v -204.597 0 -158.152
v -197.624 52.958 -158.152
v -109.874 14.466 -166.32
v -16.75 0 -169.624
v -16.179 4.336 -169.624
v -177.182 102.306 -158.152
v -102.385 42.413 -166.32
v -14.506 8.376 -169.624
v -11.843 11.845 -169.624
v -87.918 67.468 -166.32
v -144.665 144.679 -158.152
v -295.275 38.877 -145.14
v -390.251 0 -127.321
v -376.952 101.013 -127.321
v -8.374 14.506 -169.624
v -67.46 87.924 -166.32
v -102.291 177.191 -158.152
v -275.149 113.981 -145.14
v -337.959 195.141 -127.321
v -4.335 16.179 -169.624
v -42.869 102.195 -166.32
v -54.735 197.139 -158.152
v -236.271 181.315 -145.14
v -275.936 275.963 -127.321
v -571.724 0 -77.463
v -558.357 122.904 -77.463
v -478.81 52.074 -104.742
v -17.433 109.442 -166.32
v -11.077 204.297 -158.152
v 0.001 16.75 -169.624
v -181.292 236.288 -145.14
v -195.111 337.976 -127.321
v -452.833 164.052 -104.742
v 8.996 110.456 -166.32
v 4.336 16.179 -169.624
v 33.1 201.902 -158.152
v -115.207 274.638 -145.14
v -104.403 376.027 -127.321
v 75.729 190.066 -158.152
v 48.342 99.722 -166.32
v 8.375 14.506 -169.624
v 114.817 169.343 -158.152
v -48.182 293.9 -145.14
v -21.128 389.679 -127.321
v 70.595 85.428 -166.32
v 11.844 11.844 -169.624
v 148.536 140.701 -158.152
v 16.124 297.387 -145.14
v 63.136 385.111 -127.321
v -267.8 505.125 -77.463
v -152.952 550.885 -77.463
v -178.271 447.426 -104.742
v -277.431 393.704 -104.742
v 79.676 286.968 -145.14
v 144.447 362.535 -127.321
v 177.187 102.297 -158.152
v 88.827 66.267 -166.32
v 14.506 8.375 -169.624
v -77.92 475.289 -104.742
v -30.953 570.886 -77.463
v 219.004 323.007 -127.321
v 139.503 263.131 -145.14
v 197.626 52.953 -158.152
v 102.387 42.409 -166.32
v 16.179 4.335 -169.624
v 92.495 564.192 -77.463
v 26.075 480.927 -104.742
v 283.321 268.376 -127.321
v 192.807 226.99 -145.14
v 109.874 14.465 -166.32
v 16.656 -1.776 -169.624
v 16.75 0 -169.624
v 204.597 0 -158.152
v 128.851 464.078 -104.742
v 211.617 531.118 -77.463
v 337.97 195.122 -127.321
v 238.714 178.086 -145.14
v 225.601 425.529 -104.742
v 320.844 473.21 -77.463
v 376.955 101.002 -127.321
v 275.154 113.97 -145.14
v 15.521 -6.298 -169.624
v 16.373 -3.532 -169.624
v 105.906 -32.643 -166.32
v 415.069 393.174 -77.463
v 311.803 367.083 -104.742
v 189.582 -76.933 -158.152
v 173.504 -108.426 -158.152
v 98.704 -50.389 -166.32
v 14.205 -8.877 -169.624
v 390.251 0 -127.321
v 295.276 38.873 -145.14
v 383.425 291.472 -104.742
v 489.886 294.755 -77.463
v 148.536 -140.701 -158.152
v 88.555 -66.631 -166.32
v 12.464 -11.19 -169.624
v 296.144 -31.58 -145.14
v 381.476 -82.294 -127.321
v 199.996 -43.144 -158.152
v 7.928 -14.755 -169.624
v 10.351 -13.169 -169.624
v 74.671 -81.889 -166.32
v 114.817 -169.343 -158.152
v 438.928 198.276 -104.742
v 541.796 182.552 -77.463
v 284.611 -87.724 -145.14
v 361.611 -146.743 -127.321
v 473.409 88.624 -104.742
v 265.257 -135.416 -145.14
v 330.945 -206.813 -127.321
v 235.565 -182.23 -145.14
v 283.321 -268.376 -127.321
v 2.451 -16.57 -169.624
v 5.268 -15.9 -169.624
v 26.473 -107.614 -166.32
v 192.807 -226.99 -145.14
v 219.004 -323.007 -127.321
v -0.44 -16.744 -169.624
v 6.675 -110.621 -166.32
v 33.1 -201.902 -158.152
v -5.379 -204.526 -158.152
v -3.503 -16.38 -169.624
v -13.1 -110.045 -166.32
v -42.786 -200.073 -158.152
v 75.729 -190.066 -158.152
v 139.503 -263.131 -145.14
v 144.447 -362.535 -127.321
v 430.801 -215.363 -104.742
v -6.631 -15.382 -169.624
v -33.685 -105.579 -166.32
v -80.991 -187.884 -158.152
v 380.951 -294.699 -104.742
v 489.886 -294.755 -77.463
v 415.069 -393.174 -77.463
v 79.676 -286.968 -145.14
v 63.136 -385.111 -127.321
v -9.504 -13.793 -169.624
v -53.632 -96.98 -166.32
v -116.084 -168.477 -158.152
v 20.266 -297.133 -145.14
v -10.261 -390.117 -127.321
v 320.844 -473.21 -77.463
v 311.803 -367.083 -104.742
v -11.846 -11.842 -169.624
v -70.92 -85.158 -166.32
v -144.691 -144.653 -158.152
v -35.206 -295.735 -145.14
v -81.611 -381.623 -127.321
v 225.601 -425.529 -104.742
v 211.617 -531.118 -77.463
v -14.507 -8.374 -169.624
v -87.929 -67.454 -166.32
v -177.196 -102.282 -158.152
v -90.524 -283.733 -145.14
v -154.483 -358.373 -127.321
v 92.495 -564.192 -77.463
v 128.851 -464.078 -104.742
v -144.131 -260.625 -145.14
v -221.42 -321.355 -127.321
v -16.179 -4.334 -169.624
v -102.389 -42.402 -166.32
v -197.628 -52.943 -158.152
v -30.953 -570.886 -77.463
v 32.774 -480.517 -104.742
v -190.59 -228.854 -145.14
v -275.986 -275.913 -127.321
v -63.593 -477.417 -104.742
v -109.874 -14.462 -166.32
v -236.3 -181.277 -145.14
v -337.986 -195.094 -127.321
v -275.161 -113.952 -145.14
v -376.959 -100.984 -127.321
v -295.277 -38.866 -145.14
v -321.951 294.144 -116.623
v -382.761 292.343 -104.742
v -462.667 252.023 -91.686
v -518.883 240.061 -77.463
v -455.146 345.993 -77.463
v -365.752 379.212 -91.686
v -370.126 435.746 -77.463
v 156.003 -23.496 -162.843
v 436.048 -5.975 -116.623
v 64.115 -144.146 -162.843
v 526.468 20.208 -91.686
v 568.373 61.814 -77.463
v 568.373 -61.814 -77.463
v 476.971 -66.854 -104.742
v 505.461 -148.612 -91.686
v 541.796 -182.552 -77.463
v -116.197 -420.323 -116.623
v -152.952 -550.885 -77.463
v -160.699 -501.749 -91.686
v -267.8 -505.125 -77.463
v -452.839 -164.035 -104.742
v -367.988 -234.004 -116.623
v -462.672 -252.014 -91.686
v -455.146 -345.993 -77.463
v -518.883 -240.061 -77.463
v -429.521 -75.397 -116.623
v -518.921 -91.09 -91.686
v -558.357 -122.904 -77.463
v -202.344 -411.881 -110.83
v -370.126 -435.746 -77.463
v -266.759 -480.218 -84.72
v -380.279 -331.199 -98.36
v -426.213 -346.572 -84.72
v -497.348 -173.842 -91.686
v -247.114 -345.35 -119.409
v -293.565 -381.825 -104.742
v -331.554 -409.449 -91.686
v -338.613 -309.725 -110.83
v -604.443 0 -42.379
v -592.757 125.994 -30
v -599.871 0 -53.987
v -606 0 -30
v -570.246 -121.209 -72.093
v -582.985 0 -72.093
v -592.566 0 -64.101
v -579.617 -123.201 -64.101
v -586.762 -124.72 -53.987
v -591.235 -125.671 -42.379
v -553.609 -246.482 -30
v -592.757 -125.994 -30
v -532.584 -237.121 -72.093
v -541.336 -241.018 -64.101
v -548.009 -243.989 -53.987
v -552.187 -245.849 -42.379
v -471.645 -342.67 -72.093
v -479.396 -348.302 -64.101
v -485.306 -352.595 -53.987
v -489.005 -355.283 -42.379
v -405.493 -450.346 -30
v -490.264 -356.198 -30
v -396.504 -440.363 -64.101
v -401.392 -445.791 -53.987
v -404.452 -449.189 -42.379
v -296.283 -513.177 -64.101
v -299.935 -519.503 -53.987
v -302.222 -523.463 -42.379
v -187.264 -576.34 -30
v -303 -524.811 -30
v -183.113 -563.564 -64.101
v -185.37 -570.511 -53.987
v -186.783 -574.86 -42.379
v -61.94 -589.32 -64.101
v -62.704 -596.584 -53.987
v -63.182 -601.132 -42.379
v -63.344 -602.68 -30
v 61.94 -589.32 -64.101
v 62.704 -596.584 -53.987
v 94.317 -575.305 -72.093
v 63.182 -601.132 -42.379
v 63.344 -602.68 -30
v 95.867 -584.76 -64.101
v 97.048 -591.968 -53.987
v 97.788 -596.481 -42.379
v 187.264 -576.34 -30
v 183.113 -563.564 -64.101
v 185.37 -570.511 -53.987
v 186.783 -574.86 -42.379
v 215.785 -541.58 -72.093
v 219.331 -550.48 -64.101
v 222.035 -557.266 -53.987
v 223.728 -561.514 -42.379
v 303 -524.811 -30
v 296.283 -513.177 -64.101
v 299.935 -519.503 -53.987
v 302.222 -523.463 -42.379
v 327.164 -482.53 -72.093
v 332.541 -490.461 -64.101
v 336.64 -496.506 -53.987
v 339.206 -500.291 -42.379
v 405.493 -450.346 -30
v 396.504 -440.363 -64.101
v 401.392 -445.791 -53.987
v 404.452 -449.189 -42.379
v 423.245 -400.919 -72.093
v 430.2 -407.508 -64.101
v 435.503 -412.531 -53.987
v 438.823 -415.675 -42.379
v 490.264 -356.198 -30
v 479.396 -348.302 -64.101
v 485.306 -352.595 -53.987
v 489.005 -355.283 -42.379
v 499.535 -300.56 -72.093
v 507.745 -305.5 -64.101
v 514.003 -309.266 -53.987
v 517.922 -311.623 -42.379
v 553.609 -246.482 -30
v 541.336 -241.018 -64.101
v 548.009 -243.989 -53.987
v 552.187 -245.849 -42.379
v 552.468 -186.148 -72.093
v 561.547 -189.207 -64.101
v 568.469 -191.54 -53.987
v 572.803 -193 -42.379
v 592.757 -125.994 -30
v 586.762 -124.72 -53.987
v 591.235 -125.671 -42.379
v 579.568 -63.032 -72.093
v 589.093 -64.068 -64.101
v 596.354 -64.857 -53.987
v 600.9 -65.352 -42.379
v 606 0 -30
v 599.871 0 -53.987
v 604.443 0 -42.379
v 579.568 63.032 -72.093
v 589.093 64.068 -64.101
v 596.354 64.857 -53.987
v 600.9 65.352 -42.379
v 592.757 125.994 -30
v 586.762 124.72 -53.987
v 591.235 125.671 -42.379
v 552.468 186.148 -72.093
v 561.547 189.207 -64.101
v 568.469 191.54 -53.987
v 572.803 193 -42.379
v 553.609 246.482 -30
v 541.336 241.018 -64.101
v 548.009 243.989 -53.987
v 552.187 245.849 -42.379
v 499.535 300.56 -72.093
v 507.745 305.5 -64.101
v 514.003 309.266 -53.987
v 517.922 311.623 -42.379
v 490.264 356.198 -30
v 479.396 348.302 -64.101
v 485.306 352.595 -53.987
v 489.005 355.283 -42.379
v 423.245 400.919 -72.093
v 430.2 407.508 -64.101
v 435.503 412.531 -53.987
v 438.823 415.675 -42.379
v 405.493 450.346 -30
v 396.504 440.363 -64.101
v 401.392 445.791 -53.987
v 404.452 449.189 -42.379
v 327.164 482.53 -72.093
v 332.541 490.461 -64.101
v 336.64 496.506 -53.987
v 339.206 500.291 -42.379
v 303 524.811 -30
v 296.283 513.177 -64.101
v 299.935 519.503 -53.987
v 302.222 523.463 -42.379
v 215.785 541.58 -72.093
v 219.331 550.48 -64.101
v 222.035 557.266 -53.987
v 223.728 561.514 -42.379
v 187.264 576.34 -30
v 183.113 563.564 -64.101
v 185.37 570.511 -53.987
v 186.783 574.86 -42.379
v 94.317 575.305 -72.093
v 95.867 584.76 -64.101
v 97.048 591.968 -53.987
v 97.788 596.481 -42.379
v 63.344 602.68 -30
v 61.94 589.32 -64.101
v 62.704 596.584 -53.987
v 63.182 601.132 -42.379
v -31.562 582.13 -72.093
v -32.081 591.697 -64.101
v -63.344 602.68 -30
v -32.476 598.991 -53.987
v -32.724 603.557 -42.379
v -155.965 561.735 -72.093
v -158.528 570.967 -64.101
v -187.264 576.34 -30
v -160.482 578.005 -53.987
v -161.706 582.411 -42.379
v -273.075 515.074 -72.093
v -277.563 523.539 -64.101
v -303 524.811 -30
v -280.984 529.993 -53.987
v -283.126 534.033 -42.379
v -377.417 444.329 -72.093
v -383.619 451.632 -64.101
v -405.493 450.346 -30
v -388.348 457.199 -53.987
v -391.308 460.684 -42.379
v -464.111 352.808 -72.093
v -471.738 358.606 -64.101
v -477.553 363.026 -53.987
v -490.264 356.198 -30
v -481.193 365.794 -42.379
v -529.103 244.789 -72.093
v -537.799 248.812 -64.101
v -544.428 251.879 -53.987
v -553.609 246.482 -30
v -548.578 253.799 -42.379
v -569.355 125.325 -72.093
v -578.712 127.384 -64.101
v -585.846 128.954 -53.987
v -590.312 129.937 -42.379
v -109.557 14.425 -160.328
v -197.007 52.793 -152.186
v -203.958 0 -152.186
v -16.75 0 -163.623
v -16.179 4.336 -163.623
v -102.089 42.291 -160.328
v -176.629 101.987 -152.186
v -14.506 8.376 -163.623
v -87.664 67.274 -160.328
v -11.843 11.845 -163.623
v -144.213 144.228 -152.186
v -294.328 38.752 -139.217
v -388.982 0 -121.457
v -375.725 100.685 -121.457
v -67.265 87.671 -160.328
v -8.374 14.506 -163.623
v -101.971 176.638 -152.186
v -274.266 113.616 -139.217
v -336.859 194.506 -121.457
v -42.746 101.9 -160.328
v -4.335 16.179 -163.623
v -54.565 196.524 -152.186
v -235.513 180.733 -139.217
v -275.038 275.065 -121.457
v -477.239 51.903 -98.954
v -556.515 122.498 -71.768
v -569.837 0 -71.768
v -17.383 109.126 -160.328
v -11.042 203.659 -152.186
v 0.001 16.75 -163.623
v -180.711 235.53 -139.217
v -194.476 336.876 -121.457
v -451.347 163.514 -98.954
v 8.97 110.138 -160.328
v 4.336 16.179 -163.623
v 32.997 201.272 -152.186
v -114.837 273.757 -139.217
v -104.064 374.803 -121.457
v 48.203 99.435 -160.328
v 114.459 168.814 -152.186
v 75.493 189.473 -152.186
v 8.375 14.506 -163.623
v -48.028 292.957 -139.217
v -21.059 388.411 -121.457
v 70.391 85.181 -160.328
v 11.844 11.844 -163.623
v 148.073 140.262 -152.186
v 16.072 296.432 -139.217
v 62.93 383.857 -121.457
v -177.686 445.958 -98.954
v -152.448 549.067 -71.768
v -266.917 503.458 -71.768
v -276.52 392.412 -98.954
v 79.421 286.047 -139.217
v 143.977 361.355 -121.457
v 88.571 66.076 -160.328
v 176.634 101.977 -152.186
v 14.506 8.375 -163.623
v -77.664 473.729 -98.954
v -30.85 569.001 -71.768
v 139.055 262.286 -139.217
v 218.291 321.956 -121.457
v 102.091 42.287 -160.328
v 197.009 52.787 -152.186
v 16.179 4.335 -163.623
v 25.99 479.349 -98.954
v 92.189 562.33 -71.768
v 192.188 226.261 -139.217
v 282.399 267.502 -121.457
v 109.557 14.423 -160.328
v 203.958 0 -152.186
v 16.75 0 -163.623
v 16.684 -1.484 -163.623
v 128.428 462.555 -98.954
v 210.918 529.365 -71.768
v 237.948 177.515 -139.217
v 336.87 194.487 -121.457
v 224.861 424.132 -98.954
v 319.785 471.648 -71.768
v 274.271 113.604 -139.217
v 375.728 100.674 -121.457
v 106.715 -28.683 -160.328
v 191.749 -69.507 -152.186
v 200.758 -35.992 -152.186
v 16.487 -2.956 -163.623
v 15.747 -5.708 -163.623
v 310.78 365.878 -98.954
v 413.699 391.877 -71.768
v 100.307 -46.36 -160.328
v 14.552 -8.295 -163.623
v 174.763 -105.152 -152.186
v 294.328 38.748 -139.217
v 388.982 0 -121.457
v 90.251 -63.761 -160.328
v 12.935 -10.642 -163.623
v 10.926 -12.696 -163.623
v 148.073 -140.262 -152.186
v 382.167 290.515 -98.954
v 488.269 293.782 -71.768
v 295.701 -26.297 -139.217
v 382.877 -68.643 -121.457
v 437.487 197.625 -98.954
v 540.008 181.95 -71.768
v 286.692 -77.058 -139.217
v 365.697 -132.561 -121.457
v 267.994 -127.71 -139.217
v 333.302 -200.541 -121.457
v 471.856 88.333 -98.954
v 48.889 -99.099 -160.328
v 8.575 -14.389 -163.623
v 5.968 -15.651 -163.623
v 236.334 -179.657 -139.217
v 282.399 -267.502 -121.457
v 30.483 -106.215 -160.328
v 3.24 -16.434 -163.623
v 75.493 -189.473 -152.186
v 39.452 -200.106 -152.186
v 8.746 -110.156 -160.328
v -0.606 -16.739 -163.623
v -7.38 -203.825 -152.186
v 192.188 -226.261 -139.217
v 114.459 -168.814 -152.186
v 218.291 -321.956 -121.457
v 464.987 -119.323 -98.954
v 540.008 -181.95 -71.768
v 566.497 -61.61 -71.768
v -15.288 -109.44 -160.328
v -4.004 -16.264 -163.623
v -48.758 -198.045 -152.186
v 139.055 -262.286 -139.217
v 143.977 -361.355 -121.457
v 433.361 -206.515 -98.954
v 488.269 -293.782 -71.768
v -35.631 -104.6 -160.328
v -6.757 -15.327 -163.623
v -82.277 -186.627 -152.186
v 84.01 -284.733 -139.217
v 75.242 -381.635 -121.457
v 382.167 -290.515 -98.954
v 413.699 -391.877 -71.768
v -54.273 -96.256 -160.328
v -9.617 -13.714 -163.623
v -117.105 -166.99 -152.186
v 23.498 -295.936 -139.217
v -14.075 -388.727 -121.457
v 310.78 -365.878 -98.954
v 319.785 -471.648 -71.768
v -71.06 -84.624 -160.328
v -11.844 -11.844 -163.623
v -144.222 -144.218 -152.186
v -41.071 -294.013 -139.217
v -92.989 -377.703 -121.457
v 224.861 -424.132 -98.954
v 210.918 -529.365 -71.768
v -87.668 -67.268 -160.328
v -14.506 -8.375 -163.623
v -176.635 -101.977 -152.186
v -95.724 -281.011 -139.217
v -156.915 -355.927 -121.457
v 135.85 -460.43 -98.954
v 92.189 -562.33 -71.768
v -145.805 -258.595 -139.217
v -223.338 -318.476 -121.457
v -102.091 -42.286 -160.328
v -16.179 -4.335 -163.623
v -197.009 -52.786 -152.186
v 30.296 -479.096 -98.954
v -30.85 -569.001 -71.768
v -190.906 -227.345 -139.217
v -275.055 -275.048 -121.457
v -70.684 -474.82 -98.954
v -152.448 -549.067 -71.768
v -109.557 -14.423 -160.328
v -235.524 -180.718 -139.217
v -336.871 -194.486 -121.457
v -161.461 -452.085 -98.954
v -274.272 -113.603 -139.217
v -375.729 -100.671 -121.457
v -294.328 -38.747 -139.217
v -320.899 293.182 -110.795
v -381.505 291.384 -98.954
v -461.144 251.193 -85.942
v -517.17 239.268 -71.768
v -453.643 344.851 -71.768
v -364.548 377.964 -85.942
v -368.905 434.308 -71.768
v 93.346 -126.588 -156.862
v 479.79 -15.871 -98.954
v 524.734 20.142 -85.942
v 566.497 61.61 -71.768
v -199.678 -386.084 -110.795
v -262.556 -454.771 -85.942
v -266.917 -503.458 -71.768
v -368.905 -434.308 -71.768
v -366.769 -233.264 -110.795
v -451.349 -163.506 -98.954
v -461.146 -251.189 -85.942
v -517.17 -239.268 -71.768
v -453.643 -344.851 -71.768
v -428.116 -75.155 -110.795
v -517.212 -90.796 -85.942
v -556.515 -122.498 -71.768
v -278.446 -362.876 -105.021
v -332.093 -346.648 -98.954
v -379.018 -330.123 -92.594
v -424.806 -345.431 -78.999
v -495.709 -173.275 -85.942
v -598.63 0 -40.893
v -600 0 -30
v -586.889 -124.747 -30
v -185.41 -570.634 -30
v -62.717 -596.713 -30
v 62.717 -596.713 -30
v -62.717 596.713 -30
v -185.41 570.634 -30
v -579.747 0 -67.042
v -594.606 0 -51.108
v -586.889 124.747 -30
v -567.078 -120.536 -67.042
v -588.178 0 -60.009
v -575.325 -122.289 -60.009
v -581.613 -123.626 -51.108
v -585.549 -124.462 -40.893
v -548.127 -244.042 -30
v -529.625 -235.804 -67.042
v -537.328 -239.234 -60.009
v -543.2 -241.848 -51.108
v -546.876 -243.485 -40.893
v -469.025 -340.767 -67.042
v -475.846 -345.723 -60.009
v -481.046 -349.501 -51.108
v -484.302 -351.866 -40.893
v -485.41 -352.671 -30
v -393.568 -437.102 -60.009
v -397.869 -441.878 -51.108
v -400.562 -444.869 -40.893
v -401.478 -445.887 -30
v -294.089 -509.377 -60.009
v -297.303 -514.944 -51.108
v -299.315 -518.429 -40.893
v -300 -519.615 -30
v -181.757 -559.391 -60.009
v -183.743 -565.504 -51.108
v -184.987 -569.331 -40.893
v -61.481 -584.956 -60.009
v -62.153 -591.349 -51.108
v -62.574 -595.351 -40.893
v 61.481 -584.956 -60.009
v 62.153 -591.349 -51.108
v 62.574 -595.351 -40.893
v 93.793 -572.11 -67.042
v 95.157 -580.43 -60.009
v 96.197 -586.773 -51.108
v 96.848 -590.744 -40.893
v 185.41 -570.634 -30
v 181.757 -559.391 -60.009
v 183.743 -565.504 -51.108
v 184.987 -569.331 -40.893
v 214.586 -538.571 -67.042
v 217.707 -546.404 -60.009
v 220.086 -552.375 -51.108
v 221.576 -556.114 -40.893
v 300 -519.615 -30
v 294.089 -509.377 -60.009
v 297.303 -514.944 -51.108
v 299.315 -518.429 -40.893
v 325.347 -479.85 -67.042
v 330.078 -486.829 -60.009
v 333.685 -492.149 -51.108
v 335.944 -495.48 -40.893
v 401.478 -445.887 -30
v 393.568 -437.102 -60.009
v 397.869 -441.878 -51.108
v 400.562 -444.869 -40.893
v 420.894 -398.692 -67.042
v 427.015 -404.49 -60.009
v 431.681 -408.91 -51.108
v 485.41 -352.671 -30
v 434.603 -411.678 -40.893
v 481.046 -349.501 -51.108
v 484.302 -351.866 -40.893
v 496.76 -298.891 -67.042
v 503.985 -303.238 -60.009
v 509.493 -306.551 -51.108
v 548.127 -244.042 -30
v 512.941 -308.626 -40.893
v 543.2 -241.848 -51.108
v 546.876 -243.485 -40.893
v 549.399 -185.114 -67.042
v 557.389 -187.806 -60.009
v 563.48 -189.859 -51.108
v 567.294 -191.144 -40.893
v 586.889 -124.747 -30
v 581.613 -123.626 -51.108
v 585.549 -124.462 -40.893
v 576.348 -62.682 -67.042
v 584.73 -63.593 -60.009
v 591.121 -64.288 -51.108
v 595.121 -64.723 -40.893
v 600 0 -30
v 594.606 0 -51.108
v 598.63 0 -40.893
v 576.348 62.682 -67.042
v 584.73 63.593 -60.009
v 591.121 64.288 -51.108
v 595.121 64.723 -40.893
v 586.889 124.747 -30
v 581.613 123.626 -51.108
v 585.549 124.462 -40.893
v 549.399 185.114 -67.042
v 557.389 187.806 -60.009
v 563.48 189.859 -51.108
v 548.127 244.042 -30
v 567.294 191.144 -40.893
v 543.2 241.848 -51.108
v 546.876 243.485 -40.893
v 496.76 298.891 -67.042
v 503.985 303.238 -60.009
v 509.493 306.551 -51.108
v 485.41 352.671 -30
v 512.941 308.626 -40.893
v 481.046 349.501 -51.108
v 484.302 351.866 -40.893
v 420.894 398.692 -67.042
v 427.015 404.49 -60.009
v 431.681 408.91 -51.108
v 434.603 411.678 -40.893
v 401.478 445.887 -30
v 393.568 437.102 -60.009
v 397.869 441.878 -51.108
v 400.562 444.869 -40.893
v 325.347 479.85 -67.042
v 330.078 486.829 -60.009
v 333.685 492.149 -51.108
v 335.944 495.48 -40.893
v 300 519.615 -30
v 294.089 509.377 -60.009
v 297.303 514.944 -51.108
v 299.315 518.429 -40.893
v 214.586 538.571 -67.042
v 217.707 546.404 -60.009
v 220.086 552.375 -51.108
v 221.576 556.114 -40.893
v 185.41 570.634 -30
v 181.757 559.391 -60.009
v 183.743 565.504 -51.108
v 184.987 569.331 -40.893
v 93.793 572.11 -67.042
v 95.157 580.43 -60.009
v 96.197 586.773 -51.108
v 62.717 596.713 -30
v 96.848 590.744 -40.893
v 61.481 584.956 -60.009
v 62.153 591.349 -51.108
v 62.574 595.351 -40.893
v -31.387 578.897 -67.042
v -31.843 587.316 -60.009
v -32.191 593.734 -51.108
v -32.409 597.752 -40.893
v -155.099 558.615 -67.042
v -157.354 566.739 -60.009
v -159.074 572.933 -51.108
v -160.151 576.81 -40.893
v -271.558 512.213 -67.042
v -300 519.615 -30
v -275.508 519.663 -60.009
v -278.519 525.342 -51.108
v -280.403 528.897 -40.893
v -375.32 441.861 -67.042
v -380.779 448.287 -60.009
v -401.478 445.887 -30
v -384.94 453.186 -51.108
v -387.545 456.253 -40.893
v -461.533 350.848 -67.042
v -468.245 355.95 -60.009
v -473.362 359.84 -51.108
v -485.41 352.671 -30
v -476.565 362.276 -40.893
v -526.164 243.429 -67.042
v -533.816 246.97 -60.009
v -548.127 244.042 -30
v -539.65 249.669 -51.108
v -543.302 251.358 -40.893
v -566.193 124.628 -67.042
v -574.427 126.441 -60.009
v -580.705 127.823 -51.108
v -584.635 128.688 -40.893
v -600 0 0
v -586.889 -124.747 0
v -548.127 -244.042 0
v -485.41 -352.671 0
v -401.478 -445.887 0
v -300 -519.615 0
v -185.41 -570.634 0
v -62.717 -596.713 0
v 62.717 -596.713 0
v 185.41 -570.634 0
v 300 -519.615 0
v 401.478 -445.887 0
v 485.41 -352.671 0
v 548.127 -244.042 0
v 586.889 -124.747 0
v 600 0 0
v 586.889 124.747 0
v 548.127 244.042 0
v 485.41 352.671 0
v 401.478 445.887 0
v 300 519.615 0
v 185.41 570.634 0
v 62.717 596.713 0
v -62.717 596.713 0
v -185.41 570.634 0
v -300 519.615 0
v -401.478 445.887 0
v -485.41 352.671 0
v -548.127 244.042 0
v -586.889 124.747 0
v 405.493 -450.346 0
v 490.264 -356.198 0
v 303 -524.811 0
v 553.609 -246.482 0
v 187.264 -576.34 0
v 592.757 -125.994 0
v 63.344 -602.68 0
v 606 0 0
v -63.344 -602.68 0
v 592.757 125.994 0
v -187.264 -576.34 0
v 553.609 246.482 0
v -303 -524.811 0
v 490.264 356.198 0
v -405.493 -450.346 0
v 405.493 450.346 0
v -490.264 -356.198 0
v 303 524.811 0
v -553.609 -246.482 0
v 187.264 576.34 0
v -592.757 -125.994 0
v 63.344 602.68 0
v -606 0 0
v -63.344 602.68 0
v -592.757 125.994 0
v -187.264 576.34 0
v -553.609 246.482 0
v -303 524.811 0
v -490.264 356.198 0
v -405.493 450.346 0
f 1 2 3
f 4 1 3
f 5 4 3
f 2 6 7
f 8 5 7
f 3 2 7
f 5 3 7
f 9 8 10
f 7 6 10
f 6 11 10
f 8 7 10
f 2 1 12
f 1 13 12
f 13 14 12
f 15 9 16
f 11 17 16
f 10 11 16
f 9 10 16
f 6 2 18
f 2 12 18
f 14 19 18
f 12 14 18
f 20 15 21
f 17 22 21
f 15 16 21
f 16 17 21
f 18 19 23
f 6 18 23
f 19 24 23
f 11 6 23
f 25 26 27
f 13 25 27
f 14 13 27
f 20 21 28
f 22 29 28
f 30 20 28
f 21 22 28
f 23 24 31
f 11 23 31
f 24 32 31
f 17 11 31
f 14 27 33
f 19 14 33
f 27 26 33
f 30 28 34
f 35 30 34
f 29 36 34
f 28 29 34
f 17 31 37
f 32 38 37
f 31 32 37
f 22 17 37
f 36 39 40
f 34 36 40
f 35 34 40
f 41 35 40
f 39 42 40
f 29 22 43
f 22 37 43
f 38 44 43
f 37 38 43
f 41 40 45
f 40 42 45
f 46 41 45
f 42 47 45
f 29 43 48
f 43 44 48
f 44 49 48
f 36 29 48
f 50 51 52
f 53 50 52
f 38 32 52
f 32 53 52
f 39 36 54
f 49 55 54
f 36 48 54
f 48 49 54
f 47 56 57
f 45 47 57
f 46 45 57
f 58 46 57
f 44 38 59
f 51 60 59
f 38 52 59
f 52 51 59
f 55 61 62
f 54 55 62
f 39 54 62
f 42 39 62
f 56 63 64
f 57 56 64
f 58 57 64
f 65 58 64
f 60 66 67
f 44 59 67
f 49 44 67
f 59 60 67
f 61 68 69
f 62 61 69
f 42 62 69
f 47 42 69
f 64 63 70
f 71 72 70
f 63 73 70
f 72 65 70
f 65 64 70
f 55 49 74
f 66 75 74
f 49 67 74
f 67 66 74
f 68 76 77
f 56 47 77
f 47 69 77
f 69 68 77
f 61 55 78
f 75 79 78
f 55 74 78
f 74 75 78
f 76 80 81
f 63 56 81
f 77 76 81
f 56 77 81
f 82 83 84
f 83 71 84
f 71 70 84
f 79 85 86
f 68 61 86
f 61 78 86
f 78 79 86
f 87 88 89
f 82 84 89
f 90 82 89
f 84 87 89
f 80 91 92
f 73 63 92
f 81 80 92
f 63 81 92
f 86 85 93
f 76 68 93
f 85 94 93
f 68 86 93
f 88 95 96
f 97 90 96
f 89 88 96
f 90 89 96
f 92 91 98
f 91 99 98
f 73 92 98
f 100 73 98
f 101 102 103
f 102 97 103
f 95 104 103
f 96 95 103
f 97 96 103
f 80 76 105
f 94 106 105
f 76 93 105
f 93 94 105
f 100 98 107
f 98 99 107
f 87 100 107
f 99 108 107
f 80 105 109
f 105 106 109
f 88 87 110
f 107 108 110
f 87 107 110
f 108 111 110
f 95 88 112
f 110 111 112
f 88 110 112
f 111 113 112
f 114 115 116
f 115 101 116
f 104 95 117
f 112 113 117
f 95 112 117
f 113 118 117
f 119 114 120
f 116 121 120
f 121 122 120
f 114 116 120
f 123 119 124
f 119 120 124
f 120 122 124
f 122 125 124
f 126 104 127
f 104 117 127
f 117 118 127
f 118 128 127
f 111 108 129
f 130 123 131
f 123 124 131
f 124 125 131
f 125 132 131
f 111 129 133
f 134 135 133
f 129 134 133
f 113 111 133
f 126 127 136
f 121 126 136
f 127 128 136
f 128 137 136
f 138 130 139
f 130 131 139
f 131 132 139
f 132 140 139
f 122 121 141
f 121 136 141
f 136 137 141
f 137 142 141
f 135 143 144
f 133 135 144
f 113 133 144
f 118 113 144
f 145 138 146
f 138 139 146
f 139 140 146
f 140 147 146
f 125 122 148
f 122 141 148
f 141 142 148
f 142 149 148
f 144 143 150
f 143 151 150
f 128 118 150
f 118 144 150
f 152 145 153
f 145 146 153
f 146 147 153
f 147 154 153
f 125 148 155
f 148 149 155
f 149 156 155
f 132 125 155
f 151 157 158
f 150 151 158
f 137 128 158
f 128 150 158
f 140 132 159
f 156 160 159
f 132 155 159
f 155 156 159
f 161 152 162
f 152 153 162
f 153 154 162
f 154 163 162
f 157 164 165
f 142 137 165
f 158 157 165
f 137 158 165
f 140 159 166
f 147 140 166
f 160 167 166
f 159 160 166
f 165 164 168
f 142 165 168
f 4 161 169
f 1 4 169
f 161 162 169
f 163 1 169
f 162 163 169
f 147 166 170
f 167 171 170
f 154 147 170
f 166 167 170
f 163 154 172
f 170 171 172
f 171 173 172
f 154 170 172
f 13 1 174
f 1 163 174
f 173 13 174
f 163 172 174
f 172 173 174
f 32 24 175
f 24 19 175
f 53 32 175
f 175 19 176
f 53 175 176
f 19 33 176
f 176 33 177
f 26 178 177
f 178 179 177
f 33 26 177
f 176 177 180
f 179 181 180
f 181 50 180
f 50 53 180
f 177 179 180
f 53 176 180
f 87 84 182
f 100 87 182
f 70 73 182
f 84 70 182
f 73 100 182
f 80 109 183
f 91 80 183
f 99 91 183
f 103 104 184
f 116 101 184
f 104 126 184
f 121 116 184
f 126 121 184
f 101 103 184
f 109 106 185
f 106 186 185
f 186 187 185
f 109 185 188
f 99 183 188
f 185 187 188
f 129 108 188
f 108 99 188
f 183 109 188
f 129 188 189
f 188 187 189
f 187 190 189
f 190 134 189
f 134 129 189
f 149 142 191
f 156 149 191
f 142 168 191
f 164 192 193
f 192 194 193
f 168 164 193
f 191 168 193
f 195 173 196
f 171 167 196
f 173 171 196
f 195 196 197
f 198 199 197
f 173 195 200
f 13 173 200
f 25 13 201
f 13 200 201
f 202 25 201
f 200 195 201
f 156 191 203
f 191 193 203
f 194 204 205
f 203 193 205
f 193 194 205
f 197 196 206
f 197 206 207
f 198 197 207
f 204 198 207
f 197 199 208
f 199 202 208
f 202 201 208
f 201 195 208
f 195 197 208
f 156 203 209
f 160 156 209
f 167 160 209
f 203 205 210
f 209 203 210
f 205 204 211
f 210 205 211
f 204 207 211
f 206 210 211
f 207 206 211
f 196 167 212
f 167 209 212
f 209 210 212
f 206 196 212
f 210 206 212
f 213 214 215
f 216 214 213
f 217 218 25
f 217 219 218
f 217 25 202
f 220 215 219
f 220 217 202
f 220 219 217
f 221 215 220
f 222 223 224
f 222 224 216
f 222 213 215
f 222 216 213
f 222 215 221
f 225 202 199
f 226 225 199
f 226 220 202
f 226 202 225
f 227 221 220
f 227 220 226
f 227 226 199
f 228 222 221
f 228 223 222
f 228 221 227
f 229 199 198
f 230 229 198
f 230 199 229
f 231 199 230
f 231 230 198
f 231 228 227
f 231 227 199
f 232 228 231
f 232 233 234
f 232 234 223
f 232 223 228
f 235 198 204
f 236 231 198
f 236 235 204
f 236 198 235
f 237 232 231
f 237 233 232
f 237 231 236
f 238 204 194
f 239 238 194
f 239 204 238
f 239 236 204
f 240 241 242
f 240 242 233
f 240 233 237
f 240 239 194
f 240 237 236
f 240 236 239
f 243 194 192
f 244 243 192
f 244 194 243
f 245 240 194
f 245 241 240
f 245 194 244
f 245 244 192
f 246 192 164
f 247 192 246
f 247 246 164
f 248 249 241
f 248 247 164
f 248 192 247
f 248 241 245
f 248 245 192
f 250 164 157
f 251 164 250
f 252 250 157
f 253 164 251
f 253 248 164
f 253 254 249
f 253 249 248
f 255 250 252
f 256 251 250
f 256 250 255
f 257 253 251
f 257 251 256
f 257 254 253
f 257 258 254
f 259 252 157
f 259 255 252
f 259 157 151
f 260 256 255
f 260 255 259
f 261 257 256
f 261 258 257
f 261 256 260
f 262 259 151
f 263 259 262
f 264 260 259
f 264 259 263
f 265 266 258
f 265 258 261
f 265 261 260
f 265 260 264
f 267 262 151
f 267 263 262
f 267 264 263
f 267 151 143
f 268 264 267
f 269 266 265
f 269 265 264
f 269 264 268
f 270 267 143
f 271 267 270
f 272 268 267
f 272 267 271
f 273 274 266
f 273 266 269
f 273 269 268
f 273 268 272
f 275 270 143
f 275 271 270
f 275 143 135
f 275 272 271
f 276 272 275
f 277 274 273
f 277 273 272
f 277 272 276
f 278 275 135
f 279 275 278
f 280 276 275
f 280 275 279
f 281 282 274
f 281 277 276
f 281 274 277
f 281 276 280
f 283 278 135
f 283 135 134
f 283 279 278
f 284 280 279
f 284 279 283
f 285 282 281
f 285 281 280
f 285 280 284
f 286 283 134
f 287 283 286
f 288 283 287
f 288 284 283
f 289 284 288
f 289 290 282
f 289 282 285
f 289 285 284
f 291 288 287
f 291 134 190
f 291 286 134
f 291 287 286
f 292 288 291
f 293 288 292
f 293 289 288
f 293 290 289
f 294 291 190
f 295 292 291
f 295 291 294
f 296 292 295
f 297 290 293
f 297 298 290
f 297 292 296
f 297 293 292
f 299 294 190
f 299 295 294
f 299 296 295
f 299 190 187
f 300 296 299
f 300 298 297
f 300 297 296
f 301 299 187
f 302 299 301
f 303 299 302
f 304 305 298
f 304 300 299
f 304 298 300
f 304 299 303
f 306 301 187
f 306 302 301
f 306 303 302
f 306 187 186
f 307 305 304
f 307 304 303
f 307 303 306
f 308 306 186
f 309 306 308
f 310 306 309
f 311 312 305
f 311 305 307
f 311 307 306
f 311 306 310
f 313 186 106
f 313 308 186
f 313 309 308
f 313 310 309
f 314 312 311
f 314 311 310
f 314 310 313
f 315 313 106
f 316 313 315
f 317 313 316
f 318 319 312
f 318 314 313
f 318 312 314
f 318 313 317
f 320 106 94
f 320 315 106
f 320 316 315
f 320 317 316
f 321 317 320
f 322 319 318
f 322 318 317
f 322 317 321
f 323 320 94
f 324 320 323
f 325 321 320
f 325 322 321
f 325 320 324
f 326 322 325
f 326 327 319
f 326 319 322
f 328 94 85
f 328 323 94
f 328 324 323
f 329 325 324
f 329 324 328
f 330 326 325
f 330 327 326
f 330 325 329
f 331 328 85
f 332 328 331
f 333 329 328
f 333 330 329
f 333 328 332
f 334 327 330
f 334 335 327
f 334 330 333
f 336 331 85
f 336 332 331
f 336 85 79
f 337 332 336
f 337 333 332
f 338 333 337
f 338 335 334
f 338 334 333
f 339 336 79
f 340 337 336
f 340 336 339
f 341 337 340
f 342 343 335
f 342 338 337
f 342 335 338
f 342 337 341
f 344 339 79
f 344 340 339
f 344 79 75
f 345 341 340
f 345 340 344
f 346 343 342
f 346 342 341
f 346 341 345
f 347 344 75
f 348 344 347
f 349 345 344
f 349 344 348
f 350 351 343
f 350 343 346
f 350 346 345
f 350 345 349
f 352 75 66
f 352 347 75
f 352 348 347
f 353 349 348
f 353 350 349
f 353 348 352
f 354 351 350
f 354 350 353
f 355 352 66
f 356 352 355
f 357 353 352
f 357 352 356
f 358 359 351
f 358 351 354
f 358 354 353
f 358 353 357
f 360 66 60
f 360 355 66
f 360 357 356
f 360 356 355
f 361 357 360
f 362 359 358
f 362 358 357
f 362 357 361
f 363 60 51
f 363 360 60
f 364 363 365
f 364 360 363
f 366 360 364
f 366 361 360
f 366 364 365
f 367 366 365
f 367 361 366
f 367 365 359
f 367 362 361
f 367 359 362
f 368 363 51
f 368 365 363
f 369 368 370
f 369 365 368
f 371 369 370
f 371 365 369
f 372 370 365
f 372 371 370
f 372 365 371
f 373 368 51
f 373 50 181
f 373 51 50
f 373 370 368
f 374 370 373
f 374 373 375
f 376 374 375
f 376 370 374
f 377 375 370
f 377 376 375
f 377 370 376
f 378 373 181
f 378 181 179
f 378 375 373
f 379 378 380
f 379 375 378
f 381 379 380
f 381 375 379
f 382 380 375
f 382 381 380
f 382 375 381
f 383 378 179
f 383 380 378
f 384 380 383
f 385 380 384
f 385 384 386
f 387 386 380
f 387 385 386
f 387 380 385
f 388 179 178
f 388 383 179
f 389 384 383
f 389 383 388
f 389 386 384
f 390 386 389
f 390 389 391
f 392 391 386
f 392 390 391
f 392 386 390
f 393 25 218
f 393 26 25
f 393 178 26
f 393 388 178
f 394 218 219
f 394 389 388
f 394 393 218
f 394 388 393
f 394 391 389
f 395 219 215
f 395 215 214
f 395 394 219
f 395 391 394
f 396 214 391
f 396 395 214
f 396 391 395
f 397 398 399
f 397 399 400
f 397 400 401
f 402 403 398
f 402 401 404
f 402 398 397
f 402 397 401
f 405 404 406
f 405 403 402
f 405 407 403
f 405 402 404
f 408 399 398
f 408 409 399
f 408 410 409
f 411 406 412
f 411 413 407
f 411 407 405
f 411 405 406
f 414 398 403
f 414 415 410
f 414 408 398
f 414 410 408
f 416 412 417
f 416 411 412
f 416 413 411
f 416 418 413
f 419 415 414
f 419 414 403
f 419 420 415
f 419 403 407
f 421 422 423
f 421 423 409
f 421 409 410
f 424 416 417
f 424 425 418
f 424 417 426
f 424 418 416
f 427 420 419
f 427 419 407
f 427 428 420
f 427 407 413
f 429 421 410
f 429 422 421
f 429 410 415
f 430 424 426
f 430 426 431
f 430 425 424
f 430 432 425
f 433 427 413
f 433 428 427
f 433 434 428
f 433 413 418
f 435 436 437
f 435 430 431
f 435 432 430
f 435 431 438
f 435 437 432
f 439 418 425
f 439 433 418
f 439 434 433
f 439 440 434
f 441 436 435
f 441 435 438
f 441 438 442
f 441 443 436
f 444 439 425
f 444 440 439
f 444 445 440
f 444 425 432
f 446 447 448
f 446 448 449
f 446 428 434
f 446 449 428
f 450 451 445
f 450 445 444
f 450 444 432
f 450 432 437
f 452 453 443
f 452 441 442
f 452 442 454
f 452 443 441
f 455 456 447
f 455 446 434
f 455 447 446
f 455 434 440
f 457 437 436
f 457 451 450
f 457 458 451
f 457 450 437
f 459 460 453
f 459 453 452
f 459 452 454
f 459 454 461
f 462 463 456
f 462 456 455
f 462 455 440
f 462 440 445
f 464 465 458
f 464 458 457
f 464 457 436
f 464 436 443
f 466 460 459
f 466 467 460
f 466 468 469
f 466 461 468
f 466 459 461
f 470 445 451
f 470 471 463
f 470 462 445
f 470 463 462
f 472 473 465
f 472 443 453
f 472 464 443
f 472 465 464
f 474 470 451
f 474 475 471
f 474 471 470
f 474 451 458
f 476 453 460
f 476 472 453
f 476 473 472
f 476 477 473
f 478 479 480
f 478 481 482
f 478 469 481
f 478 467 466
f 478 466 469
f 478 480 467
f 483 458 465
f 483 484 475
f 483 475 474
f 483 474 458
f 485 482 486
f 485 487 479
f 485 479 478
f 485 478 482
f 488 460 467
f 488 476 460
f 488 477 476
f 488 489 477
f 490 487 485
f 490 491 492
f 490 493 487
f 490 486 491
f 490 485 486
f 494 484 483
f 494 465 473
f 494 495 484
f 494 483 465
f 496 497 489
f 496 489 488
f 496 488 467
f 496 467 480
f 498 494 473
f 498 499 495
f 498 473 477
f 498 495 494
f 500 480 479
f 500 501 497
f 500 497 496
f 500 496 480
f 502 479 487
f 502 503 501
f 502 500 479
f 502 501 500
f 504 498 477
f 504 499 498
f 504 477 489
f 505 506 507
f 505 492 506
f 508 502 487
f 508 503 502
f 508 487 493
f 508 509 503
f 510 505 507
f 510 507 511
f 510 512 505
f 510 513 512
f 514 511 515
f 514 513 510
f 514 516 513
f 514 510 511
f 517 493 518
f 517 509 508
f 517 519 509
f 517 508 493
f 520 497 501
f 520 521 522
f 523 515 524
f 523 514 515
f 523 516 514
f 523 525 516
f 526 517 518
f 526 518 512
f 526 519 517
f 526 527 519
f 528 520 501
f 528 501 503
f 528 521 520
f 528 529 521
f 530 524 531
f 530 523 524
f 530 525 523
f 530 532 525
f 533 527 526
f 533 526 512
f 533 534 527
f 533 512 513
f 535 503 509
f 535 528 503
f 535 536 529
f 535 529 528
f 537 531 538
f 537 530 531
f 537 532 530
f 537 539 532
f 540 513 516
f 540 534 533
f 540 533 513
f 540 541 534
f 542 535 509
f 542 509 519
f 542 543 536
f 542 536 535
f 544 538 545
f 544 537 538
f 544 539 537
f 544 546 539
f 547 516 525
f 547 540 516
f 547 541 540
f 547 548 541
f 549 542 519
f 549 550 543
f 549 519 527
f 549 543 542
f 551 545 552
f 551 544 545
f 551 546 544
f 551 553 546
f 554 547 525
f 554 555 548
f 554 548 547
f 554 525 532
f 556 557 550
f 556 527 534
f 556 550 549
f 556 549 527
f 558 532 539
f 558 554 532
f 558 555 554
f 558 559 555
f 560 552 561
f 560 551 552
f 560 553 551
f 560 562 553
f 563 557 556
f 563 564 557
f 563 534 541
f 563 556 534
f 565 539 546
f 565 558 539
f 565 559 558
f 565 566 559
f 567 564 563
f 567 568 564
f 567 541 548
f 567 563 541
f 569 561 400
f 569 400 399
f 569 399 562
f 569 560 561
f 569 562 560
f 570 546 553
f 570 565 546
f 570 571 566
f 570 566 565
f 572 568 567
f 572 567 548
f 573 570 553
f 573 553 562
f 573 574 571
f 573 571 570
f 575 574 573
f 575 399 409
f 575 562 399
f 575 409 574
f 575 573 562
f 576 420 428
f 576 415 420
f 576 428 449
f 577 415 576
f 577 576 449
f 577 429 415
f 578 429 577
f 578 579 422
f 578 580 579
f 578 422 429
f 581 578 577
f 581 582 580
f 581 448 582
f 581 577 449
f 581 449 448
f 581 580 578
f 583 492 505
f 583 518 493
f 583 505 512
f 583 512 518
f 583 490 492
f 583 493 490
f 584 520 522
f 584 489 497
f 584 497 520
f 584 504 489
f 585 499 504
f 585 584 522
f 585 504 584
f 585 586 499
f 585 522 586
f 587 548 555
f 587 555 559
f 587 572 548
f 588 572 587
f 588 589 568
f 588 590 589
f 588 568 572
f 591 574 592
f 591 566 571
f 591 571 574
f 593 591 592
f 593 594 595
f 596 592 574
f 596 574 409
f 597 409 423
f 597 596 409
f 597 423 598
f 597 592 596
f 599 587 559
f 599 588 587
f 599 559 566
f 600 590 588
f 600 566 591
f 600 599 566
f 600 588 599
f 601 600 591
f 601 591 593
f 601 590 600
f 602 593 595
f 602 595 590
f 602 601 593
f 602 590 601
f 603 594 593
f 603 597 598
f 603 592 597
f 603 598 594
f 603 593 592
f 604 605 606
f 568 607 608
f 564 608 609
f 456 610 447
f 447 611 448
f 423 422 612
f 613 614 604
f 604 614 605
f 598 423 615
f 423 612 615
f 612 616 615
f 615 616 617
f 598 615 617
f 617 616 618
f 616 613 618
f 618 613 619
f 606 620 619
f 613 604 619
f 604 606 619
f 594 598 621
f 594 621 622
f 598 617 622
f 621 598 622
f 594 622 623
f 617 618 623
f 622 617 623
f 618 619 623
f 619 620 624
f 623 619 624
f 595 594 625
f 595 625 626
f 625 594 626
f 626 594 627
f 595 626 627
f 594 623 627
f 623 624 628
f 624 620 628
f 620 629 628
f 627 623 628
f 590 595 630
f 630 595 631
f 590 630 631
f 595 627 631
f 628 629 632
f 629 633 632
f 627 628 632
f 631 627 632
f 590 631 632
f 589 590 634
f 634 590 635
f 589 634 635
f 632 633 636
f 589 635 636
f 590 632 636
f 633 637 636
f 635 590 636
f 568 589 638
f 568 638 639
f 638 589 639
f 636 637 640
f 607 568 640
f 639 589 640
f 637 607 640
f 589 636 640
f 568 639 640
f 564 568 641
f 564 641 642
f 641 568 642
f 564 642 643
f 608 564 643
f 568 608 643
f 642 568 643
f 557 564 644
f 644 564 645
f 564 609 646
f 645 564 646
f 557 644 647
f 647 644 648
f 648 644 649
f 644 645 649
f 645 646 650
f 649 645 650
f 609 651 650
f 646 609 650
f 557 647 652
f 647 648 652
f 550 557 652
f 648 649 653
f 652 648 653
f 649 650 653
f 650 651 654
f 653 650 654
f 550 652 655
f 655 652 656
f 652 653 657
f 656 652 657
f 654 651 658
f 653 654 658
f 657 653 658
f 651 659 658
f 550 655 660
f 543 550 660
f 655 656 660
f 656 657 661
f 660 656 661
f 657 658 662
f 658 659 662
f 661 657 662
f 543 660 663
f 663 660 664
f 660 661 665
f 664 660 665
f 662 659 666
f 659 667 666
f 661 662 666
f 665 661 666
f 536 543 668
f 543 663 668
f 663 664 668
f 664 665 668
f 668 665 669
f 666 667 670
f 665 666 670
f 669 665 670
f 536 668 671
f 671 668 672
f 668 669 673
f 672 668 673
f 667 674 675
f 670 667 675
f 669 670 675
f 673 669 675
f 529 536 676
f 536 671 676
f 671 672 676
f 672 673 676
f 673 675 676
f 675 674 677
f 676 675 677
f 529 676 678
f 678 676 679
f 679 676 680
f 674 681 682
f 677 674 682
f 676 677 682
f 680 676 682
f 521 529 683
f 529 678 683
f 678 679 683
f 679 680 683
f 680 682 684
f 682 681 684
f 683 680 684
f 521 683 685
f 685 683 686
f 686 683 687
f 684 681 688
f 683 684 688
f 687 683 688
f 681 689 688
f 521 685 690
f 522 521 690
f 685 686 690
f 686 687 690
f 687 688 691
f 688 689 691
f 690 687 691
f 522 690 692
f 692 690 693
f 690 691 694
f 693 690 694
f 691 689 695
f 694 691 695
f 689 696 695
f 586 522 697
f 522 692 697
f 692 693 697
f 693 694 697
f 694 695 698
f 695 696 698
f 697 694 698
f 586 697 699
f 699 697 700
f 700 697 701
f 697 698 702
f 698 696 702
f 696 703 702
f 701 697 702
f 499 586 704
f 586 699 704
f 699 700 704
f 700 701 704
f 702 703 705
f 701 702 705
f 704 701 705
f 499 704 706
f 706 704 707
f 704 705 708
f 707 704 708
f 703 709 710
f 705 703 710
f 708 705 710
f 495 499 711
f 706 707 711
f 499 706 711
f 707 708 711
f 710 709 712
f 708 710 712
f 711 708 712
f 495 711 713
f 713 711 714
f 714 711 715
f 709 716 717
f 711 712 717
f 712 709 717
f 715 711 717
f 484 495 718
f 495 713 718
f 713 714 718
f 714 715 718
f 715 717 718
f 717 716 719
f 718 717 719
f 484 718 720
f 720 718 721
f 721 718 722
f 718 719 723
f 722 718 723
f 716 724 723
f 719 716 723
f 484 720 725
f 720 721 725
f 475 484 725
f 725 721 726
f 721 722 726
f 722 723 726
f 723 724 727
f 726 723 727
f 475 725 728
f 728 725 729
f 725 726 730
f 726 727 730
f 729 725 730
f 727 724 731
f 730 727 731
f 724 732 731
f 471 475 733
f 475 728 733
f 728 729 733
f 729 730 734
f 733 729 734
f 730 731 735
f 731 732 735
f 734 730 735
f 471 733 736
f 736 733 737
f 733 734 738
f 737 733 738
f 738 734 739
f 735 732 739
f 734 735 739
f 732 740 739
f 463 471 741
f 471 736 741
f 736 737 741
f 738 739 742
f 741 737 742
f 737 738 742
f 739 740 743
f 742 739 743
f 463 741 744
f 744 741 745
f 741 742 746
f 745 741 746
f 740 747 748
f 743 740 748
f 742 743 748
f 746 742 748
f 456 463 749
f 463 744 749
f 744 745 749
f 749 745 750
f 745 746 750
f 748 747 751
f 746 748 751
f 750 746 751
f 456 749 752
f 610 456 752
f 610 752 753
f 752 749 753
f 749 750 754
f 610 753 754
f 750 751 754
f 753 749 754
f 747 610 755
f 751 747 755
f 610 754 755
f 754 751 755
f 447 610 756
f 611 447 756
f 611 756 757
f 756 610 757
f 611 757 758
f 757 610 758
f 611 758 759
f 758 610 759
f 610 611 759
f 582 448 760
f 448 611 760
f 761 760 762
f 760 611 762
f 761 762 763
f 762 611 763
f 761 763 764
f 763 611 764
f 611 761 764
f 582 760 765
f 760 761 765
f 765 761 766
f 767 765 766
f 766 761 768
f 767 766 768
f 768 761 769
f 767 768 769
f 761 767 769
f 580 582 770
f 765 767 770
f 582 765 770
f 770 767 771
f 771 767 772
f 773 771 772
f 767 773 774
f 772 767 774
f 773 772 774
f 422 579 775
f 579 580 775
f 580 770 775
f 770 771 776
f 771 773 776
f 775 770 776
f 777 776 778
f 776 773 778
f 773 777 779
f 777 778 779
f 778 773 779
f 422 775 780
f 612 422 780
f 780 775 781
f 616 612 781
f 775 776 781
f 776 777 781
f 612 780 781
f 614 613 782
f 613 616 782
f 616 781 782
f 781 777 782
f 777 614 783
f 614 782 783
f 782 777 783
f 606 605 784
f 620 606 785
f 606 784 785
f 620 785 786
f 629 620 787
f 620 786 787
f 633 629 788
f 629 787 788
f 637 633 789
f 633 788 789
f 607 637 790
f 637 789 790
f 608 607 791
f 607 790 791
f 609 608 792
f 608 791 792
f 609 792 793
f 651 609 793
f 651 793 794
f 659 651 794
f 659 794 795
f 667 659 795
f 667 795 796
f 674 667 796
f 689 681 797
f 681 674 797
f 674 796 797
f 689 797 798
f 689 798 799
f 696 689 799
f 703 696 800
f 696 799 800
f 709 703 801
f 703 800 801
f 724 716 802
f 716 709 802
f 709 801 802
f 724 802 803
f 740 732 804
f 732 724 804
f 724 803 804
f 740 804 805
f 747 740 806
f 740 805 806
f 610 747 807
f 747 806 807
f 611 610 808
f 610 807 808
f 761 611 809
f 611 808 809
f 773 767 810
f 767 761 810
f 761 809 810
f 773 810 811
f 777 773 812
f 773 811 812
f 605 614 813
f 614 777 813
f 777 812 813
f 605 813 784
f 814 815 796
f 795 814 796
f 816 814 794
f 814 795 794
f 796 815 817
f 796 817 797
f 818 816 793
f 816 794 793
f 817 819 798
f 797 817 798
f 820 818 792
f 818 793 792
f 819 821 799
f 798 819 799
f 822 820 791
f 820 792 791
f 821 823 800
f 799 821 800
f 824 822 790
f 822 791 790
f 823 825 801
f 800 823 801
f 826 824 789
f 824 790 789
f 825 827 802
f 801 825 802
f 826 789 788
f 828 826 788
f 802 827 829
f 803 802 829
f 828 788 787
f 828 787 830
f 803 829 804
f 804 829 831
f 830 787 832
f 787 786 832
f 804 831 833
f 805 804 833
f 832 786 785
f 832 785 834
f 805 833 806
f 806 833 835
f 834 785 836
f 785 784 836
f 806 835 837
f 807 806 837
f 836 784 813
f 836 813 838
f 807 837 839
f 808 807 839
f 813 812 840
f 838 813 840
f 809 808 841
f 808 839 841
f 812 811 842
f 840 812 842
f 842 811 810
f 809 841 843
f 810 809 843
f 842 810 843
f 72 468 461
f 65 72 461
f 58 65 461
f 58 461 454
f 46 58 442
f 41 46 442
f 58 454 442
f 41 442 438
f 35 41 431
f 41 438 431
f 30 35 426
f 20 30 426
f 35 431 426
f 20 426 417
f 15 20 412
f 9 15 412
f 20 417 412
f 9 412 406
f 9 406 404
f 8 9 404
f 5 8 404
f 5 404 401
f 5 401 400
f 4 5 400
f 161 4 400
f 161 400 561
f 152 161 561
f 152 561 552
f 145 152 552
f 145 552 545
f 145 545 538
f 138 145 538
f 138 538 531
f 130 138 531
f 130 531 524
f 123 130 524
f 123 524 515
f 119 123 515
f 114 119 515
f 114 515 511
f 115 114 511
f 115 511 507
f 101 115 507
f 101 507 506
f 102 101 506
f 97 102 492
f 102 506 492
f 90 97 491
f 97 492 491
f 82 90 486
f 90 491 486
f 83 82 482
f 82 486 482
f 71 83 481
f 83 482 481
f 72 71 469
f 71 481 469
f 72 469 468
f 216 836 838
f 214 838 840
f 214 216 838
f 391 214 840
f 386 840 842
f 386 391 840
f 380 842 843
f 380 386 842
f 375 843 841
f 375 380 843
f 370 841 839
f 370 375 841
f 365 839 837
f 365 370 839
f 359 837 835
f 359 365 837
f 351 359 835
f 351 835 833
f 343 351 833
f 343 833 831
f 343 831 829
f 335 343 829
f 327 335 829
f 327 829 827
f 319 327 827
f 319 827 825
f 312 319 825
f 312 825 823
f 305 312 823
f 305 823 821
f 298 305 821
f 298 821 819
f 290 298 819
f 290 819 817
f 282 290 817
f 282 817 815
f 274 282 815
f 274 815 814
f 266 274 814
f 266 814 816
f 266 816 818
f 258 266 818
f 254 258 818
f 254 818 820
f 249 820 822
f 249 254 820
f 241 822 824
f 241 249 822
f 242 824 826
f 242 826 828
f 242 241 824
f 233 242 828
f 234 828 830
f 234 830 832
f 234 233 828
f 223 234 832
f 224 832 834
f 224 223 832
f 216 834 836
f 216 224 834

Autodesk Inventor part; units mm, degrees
ref_plane "YZ Plane" through (0, 0, 0) normal (1, 0, 0) x (0, 1, 0)
ref_plane "XZ Plane" through (0, 0, 0) normal (0, 1, 0) x (-1, 0, 0)
ref_plane "XY Plane" through (0, 0, 0) normal (0, 0, 1) x (1, 0, 0)
sketch "Sketch1" plane through (0, 0, 0) normal (0, 1, 0) x (-1, 0, 0)
  line L0 (606, 0) -> (606, -30)
  arc A0 (571.724, -77.4632) -> (606, -30) centre (556, -30) ccw
  arc A1 (0, -169.7009) -> (571.724, -77.4632) centre (0, 1648.2991) ccw
  line L1 (0, 191.6842) -> (0, -191.6842)
  arc A2 (0, -163.7009) -> (569.8371, -71.7676) centre (0, 1648.2991) ccw
  arc A3 (569.8371, -71.7676) -> (600, -30) centre (556, -30) ccw
  line L2 (600, -30) -> (600, 0)
  line L3 (600, 0) -> (606, 0)
  line L4 (0, -163.7009) -> (0, -169.7009)
  point P0 (0, 0)
  point P1 (0, 0)
  point P2 (0, -166.7009)
  point P3 (0, -163.7009)
  point P4 (0, -169.7009)
  dimension "d0" = 50
  dimension "d1" = 30
  dimension "d3" = 1818
  dimension "d4" = 606
  dimension "d6" = 6
revolve "Revolution1" add sketch "Sketch1" angle 360 about axis through (0, 0, 191.6842) along (0, 0, -1)
sketch "Sketch2" plane through (0, 0, 0) normal (0, 0, 1) x (1, 0, 0)
  circle A0 centre (0, 0) radius 16.75
  dimension "d8" = 33.5
extrude "Extrusion1" cut sketch "Sketch2" against normal through all
properties part number "Сферическое дно D1000"
